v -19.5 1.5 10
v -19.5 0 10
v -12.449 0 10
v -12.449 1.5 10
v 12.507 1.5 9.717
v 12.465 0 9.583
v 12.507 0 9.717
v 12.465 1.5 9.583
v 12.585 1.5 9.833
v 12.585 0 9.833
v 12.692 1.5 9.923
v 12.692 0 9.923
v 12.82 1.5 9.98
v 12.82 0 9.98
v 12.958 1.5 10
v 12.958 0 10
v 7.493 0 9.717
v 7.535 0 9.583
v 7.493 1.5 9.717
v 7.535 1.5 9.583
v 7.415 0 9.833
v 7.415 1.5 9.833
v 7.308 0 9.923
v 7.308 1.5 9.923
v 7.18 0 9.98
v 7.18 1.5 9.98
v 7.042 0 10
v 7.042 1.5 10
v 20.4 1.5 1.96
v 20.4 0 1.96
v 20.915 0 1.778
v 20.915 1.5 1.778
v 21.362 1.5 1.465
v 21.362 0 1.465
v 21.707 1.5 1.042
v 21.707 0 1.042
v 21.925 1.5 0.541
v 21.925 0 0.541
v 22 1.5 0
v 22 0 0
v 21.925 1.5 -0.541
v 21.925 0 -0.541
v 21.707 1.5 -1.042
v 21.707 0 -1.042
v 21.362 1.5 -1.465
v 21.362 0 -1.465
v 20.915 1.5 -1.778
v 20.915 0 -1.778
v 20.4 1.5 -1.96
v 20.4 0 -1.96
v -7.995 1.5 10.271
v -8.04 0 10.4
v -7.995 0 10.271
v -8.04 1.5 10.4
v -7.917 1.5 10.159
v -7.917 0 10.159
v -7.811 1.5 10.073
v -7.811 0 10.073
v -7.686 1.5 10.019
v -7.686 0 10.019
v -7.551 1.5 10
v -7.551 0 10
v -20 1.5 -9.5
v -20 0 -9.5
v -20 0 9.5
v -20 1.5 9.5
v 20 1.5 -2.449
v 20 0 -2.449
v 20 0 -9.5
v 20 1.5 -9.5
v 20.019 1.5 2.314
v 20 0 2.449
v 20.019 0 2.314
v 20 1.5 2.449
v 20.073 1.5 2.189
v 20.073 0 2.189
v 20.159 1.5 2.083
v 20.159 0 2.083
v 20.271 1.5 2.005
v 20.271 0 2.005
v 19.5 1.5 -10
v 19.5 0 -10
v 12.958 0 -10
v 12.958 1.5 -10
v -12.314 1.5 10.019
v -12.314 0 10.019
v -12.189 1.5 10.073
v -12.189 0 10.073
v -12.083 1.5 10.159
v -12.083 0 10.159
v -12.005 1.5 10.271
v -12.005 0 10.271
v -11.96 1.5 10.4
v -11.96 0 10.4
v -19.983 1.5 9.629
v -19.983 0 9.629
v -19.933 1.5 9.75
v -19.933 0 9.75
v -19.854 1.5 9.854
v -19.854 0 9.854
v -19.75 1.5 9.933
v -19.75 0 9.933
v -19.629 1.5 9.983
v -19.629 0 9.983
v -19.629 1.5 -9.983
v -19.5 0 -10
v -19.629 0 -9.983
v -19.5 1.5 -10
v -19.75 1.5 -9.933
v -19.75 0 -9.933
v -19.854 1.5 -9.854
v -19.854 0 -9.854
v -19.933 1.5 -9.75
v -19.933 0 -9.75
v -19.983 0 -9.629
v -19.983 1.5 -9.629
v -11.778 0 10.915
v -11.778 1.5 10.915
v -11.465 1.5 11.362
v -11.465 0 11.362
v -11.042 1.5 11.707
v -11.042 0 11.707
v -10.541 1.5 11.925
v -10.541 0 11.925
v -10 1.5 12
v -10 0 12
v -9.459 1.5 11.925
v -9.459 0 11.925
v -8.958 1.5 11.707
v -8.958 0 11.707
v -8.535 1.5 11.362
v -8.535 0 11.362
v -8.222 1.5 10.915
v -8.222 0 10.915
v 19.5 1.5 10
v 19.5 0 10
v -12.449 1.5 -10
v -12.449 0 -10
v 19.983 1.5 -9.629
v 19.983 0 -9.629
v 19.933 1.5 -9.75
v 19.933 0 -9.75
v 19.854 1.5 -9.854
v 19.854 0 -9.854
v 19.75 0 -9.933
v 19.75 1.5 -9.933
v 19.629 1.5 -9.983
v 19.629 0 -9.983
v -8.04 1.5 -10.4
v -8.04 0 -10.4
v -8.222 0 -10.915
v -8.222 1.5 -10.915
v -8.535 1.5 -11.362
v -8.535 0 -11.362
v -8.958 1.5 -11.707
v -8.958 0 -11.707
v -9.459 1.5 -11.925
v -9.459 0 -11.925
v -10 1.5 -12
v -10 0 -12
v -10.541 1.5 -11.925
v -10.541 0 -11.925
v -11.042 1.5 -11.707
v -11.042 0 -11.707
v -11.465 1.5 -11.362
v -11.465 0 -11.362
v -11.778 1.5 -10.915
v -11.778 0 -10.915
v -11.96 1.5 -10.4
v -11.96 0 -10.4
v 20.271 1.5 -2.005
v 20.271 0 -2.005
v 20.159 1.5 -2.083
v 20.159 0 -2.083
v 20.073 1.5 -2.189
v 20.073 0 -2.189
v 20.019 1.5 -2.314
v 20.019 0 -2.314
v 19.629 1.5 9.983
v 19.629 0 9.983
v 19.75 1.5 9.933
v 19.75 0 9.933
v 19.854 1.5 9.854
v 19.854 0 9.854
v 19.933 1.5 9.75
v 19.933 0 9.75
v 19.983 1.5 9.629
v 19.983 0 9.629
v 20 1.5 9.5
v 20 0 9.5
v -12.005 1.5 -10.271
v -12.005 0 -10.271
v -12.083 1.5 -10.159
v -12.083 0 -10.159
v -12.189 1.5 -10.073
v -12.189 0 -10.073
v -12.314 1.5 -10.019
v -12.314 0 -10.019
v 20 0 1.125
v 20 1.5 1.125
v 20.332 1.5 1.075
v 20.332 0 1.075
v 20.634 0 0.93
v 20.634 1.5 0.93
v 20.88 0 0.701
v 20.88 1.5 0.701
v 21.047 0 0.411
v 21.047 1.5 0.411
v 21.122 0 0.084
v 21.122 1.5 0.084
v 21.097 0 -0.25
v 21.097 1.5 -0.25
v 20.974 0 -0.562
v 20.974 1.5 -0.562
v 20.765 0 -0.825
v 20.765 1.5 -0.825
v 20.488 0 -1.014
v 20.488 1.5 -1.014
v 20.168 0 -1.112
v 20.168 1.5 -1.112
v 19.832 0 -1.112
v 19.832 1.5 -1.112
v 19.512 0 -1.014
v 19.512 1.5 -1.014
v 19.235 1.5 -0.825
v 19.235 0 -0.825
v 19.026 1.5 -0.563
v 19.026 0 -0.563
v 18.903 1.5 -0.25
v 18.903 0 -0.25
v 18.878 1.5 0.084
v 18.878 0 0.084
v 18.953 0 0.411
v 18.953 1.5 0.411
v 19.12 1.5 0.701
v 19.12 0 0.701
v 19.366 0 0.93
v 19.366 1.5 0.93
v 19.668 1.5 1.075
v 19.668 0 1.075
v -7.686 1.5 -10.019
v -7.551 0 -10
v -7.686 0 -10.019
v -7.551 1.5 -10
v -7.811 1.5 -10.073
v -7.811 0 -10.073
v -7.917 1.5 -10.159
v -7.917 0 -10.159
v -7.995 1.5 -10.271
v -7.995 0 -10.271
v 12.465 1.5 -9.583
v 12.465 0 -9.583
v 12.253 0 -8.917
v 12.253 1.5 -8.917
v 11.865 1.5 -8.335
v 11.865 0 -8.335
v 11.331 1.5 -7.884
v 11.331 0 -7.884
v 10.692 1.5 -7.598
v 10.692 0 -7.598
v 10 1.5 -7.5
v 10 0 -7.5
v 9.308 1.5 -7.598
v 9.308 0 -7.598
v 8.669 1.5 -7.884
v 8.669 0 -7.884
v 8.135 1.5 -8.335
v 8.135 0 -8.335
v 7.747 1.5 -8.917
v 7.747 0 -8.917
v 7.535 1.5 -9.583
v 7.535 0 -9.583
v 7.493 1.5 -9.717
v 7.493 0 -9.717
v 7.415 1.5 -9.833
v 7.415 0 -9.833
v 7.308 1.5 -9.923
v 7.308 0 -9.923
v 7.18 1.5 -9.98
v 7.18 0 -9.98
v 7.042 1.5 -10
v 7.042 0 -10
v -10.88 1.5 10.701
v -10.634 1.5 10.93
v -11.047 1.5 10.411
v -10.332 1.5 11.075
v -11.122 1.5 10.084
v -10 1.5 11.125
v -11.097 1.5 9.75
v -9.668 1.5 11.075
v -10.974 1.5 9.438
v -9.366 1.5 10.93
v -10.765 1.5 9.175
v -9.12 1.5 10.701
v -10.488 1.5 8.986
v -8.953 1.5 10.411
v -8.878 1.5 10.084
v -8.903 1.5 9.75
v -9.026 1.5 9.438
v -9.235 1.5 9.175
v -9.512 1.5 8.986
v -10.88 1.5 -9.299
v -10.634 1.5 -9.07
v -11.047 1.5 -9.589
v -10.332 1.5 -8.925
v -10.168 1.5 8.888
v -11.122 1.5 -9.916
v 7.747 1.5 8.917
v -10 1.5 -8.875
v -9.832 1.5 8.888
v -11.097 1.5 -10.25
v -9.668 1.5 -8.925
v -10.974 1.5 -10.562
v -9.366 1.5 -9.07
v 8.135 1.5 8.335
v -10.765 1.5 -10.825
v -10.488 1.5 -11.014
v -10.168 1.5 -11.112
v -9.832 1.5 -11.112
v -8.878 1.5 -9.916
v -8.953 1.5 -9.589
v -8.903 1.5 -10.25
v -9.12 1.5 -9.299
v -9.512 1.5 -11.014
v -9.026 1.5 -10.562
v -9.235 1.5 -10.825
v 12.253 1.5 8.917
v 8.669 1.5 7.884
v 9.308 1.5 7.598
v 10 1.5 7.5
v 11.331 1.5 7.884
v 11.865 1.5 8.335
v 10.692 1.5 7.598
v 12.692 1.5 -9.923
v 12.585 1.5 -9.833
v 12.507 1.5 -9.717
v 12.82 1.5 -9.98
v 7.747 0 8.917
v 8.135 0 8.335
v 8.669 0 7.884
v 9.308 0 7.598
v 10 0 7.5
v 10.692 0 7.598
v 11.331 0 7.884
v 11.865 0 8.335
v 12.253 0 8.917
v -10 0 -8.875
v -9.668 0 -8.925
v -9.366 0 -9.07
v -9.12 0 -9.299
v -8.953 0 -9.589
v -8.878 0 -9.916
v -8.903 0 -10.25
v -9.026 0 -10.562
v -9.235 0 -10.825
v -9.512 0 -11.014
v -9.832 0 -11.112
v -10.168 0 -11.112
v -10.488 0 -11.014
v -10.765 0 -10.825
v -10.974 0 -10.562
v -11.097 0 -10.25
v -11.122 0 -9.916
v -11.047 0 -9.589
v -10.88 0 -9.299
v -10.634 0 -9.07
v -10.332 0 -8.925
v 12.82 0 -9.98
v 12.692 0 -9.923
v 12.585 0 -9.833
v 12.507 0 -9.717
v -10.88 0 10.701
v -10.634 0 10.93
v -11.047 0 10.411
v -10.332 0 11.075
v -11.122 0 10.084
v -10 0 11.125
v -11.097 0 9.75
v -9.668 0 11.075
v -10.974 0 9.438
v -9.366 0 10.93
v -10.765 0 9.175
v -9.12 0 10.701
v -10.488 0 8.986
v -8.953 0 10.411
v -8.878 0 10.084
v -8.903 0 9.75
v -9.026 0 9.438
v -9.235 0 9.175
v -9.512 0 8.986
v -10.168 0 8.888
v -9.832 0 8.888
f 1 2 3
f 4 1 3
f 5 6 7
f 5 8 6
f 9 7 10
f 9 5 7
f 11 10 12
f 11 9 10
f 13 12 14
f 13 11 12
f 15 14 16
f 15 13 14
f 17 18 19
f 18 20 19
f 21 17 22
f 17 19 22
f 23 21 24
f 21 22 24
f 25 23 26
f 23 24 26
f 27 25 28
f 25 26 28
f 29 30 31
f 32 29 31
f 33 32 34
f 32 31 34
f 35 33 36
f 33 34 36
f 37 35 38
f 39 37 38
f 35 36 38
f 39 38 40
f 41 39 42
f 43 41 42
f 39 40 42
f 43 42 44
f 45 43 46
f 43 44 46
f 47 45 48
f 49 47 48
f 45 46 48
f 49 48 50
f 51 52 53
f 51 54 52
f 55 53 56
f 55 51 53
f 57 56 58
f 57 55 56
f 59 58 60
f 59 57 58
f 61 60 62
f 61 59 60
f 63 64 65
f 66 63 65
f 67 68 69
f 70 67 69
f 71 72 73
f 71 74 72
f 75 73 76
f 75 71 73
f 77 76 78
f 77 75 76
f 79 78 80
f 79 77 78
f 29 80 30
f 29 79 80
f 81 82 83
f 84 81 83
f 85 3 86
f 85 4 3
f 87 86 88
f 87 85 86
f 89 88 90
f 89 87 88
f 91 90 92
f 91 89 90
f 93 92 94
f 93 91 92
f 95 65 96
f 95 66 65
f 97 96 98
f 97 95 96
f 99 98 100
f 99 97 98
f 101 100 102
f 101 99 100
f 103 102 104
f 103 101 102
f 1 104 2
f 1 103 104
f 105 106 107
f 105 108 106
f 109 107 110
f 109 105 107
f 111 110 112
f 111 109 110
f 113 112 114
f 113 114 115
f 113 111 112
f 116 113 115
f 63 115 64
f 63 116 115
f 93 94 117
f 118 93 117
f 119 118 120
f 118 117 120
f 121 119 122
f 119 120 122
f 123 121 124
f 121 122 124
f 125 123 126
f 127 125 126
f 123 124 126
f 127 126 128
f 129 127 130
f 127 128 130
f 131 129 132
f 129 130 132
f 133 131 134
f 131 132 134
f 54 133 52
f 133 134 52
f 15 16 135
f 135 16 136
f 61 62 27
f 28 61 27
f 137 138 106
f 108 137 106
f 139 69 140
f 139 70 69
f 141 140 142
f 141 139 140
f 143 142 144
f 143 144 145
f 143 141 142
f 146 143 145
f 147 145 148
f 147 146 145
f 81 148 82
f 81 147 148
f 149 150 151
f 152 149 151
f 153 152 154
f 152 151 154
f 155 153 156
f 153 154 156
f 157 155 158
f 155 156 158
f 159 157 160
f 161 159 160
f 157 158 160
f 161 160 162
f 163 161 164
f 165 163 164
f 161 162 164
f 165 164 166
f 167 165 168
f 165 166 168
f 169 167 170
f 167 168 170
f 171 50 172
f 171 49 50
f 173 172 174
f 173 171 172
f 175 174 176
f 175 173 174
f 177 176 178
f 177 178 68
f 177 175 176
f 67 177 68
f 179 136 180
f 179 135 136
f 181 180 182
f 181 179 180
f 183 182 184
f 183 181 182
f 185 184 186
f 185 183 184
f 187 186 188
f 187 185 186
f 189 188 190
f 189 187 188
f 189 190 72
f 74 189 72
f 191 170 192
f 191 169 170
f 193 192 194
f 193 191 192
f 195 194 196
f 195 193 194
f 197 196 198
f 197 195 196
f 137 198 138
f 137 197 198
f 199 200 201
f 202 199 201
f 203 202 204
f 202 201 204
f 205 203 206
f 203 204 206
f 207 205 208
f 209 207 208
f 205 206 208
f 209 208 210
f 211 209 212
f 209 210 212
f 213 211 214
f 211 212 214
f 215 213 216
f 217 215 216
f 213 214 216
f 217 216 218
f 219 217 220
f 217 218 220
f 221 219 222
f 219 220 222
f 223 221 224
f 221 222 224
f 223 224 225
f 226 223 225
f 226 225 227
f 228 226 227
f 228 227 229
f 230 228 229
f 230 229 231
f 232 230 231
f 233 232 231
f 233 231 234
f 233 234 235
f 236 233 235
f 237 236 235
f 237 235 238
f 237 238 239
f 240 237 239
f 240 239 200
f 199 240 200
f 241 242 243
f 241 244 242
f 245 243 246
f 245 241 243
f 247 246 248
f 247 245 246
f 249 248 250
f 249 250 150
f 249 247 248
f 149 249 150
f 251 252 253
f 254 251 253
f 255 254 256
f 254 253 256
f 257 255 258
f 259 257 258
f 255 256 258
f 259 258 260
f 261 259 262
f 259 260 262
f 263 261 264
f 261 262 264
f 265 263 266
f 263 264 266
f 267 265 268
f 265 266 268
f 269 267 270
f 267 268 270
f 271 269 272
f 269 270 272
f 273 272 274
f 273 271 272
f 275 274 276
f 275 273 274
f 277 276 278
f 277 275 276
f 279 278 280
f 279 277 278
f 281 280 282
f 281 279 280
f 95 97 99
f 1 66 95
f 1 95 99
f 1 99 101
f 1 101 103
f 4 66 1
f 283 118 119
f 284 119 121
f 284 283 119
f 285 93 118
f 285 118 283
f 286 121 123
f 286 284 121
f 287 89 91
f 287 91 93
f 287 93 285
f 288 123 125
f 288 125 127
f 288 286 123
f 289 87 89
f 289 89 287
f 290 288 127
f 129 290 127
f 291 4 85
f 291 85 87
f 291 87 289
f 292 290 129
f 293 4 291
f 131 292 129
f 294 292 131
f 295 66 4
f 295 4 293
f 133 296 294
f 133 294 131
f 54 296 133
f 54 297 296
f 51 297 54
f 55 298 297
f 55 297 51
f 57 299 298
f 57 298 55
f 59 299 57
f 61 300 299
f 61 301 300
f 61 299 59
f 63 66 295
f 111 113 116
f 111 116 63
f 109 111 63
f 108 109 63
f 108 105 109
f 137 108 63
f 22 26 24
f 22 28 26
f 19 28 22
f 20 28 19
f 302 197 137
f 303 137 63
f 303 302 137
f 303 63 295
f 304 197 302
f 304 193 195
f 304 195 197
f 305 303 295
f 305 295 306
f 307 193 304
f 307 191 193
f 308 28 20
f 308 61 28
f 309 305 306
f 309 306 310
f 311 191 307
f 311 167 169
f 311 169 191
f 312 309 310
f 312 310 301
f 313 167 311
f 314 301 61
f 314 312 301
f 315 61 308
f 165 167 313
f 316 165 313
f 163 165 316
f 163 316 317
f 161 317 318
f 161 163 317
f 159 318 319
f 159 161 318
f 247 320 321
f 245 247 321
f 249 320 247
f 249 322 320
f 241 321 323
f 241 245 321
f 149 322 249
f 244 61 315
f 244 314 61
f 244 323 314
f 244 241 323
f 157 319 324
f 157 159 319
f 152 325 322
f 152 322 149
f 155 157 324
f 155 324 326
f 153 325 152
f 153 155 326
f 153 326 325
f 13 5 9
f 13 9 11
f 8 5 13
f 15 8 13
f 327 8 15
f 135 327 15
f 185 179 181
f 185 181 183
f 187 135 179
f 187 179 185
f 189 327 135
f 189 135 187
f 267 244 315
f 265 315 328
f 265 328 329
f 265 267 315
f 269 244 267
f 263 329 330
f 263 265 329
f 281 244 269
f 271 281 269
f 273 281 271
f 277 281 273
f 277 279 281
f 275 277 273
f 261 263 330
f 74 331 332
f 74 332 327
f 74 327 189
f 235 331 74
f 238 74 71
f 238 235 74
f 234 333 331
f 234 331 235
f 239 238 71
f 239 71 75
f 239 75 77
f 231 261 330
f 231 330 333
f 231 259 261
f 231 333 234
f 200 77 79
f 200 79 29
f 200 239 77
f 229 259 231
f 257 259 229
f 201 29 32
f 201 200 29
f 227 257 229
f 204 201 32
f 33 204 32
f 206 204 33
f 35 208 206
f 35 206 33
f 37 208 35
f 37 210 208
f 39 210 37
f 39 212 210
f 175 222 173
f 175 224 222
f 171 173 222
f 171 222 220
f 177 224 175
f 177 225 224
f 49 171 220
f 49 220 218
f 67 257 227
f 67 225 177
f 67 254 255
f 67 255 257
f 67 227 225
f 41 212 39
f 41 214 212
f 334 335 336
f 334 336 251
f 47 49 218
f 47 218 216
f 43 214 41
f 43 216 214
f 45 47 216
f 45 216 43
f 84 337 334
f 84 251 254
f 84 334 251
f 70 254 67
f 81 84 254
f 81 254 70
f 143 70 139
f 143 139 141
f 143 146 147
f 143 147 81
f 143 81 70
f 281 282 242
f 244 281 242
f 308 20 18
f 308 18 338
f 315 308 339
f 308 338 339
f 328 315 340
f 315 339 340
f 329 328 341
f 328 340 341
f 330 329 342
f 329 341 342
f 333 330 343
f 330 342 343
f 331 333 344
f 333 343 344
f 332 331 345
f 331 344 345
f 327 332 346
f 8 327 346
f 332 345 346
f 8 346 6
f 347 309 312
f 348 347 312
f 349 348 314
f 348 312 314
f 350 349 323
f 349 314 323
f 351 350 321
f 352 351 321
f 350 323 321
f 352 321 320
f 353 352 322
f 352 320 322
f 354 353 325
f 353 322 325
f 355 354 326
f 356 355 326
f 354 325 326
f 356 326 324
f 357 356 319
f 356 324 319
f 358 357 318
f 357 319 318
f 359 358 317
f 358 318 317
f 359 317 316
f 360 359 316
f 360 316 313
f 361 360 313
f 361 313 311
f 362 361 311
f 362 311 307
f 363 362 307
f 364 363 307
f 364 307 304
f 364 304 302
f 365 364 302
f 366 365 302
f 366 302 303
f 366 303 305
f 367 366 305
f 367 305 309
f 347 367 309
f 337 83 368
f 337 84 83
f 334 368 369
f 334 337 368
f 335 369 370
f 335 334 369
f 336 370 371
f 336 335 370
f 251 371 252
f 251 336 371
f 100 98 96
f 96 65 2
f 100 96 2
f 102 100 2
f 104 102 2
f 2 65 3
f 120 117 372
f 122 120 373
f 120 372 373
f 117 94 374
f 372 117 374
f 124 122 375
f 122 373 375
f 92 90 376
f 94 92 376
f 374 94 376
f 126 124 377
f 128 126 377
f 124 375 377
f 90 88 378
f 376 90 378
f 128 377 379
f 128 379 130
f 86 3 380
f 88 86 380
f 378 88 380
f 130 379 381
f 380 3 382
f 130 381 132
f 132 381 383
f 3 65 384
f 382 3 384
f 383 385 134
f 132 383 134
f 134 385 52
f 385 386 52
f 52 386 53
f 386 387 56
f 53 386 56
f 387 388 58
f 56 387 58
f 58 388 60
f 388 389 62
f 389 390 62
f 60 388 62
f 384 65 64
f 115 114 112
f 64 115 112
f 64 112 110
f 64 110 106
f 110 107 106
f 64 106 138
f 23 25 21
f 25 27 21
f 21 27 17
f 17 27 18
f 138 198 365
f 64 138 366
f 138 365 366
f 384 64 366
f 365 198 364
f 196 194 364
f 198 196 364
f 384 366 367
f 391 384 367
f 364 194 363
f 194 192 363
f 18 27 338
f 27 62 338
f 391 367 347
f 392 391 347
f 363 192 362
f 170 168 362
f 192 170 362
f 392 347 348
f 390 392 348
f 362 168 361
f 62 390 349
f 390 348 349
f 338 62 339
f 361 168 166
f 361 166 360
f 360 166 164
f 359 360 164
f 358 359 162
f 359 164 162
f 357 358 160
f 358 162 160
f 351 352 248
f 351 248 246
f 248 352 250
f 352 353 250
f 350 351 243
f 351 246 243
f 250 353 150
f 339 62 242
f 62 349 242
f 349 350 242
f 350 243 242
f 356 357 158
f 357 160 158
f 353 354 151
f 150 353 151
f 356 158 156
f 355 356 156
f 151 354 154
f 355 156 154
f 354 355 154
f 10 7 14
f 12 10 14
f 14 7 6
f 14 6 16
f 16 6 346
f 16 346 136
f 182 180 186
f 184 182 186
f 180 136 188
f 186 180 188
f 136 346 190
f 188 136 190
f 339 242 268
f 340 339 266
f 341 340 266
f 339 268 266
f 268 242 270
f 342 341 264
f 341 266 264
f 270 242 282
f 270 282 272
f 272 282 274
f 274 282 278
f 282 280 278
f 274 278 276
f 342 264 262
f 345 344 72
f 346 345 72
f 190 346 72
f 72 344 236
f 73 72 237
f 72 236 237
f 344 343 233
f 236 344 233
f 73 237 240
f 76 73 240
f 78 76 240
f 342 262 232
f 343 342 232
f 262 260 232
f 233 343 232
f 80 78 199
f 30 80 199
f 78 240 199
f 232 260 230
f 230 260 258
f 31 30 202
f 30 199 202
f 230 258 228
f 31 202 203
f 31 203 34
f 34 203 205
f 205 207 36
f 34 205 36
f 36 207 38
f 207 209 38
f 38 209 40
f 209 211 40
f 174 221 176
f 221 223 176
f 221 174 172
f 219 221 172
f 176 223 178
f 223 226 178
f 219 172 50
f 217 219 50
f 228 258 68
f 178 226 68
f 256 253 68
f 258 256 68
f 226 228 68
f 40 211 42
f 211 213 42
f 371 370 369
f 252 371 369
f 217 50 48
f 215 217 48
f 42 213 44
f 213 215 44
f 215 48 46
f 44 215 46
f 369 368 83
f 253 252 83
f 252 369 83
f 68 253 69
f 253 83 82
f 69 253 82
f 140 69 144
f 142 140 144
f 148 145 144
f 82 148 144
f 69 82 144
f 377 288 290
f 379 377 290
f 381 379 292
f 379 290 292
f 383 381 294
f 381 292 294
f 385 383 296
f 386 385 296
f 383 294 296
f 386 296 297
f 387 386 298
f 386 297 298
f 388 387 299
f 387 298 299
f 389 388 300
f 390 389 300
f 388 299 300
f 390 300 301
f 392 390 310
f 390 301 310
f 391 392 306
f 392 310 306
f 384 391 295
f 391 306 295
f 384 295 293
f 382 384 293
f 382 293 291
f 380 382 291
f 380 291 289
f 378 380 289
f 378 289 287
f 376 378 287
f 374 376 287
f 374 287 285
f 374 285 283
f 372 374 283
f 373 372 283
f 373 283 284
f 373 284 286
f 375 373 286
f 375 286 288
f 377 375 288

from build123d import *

# Parameters (mm, degrees)
BOSS_EXTRUDE1_DEPTH = 1.5
FILLET1_R           = 0.5
SKETCH2_R           = 1.125
CUT_EXTRUDE1_DEPTH  = 26.104780421


with BuildPart() as part:
    # Sketch1 → Boss-Extrude1 (new body)
    with BuildSketch(Plane(origin=(0, 0, 0), x_dir=(1, 0, 0), z_dir=(0, 1, 0))):
        with BuildLine():
            ThreePointArc((7.5, -10), (10, -7.5), (12.5, -10))
            Line((12.5, -10), (20, -10))
            Line((20, -10), (20, -2))
            ThreePointArc((20, -2), (22, 0), (20, 2))
            Line((20, 2), (20, 10))
            Line((20, 10), (12.5, 10))
            ThreePointArc((12.5, 10), (10, 7.5), (7.5, 10))
            Line((7.5, 10), (-8, 10))
            ThreePointArc((-8, 10), (-10, 12), (-12, 10))
            Line((-12, 10), (-20, 10))
            Line((-20, 10), (-20, -10))
            Line((-20, -10), (-12, -10))
            ThreePointArc((-12, -10), (-10, -12), (-8, -10))
            Line((-8, -10), (7.5, -10))
        make_face()
    extrude(amount=BOSS_EXTRUDE1_DEPTH)

    # Fillet1
    fillet1_edges = [part.edges().sort_by_distance(p)[0] for p in [
        (-8, 0.75, 10),
        (-12, 0.75, 10),
        (-20, 0.75, 10),
        (-20, 0.75, -10),
        (-12, 0.75, -10),
        (-8, 0.75, -10),
        (7.5, 0.75, -10),
        (12.5, 0.75, -10),
        (20, 0.75, -10),
        (20, 0.75, -2),
        (20, 0.75, 2),
        (20, 0.75, 10),
        (12.5, 0.75, 10),
        (7.5, 0.75, 10),
    ]]
    fillet(fillet1_edges, radius=FILLET1_R)

    # Sketch2 → Cut-Extrude1 (cut, through all)
    with BuildSketch(Plane(origin=(0, 1.5, 0), x_dir=(1, 0, 0), z_dir=(0, 1, 0))):
        with Locations(Location((20, 0, 0), (0, 0, 270))):
            Circle(SKETCH2_R)
        with Locations(Location((-10, -10, 0), (0, 0, 270))):
            Circle(SKETCH2_R)
        with Locations(Location((-10, 10, 0), (0, 0, 270))):
            Circle(SKETCH2_R)
    extrude(amount=-CUT_EXTRUDE1_DEPTH, mode=Mode.SUBTRACT)


solid = part.part
